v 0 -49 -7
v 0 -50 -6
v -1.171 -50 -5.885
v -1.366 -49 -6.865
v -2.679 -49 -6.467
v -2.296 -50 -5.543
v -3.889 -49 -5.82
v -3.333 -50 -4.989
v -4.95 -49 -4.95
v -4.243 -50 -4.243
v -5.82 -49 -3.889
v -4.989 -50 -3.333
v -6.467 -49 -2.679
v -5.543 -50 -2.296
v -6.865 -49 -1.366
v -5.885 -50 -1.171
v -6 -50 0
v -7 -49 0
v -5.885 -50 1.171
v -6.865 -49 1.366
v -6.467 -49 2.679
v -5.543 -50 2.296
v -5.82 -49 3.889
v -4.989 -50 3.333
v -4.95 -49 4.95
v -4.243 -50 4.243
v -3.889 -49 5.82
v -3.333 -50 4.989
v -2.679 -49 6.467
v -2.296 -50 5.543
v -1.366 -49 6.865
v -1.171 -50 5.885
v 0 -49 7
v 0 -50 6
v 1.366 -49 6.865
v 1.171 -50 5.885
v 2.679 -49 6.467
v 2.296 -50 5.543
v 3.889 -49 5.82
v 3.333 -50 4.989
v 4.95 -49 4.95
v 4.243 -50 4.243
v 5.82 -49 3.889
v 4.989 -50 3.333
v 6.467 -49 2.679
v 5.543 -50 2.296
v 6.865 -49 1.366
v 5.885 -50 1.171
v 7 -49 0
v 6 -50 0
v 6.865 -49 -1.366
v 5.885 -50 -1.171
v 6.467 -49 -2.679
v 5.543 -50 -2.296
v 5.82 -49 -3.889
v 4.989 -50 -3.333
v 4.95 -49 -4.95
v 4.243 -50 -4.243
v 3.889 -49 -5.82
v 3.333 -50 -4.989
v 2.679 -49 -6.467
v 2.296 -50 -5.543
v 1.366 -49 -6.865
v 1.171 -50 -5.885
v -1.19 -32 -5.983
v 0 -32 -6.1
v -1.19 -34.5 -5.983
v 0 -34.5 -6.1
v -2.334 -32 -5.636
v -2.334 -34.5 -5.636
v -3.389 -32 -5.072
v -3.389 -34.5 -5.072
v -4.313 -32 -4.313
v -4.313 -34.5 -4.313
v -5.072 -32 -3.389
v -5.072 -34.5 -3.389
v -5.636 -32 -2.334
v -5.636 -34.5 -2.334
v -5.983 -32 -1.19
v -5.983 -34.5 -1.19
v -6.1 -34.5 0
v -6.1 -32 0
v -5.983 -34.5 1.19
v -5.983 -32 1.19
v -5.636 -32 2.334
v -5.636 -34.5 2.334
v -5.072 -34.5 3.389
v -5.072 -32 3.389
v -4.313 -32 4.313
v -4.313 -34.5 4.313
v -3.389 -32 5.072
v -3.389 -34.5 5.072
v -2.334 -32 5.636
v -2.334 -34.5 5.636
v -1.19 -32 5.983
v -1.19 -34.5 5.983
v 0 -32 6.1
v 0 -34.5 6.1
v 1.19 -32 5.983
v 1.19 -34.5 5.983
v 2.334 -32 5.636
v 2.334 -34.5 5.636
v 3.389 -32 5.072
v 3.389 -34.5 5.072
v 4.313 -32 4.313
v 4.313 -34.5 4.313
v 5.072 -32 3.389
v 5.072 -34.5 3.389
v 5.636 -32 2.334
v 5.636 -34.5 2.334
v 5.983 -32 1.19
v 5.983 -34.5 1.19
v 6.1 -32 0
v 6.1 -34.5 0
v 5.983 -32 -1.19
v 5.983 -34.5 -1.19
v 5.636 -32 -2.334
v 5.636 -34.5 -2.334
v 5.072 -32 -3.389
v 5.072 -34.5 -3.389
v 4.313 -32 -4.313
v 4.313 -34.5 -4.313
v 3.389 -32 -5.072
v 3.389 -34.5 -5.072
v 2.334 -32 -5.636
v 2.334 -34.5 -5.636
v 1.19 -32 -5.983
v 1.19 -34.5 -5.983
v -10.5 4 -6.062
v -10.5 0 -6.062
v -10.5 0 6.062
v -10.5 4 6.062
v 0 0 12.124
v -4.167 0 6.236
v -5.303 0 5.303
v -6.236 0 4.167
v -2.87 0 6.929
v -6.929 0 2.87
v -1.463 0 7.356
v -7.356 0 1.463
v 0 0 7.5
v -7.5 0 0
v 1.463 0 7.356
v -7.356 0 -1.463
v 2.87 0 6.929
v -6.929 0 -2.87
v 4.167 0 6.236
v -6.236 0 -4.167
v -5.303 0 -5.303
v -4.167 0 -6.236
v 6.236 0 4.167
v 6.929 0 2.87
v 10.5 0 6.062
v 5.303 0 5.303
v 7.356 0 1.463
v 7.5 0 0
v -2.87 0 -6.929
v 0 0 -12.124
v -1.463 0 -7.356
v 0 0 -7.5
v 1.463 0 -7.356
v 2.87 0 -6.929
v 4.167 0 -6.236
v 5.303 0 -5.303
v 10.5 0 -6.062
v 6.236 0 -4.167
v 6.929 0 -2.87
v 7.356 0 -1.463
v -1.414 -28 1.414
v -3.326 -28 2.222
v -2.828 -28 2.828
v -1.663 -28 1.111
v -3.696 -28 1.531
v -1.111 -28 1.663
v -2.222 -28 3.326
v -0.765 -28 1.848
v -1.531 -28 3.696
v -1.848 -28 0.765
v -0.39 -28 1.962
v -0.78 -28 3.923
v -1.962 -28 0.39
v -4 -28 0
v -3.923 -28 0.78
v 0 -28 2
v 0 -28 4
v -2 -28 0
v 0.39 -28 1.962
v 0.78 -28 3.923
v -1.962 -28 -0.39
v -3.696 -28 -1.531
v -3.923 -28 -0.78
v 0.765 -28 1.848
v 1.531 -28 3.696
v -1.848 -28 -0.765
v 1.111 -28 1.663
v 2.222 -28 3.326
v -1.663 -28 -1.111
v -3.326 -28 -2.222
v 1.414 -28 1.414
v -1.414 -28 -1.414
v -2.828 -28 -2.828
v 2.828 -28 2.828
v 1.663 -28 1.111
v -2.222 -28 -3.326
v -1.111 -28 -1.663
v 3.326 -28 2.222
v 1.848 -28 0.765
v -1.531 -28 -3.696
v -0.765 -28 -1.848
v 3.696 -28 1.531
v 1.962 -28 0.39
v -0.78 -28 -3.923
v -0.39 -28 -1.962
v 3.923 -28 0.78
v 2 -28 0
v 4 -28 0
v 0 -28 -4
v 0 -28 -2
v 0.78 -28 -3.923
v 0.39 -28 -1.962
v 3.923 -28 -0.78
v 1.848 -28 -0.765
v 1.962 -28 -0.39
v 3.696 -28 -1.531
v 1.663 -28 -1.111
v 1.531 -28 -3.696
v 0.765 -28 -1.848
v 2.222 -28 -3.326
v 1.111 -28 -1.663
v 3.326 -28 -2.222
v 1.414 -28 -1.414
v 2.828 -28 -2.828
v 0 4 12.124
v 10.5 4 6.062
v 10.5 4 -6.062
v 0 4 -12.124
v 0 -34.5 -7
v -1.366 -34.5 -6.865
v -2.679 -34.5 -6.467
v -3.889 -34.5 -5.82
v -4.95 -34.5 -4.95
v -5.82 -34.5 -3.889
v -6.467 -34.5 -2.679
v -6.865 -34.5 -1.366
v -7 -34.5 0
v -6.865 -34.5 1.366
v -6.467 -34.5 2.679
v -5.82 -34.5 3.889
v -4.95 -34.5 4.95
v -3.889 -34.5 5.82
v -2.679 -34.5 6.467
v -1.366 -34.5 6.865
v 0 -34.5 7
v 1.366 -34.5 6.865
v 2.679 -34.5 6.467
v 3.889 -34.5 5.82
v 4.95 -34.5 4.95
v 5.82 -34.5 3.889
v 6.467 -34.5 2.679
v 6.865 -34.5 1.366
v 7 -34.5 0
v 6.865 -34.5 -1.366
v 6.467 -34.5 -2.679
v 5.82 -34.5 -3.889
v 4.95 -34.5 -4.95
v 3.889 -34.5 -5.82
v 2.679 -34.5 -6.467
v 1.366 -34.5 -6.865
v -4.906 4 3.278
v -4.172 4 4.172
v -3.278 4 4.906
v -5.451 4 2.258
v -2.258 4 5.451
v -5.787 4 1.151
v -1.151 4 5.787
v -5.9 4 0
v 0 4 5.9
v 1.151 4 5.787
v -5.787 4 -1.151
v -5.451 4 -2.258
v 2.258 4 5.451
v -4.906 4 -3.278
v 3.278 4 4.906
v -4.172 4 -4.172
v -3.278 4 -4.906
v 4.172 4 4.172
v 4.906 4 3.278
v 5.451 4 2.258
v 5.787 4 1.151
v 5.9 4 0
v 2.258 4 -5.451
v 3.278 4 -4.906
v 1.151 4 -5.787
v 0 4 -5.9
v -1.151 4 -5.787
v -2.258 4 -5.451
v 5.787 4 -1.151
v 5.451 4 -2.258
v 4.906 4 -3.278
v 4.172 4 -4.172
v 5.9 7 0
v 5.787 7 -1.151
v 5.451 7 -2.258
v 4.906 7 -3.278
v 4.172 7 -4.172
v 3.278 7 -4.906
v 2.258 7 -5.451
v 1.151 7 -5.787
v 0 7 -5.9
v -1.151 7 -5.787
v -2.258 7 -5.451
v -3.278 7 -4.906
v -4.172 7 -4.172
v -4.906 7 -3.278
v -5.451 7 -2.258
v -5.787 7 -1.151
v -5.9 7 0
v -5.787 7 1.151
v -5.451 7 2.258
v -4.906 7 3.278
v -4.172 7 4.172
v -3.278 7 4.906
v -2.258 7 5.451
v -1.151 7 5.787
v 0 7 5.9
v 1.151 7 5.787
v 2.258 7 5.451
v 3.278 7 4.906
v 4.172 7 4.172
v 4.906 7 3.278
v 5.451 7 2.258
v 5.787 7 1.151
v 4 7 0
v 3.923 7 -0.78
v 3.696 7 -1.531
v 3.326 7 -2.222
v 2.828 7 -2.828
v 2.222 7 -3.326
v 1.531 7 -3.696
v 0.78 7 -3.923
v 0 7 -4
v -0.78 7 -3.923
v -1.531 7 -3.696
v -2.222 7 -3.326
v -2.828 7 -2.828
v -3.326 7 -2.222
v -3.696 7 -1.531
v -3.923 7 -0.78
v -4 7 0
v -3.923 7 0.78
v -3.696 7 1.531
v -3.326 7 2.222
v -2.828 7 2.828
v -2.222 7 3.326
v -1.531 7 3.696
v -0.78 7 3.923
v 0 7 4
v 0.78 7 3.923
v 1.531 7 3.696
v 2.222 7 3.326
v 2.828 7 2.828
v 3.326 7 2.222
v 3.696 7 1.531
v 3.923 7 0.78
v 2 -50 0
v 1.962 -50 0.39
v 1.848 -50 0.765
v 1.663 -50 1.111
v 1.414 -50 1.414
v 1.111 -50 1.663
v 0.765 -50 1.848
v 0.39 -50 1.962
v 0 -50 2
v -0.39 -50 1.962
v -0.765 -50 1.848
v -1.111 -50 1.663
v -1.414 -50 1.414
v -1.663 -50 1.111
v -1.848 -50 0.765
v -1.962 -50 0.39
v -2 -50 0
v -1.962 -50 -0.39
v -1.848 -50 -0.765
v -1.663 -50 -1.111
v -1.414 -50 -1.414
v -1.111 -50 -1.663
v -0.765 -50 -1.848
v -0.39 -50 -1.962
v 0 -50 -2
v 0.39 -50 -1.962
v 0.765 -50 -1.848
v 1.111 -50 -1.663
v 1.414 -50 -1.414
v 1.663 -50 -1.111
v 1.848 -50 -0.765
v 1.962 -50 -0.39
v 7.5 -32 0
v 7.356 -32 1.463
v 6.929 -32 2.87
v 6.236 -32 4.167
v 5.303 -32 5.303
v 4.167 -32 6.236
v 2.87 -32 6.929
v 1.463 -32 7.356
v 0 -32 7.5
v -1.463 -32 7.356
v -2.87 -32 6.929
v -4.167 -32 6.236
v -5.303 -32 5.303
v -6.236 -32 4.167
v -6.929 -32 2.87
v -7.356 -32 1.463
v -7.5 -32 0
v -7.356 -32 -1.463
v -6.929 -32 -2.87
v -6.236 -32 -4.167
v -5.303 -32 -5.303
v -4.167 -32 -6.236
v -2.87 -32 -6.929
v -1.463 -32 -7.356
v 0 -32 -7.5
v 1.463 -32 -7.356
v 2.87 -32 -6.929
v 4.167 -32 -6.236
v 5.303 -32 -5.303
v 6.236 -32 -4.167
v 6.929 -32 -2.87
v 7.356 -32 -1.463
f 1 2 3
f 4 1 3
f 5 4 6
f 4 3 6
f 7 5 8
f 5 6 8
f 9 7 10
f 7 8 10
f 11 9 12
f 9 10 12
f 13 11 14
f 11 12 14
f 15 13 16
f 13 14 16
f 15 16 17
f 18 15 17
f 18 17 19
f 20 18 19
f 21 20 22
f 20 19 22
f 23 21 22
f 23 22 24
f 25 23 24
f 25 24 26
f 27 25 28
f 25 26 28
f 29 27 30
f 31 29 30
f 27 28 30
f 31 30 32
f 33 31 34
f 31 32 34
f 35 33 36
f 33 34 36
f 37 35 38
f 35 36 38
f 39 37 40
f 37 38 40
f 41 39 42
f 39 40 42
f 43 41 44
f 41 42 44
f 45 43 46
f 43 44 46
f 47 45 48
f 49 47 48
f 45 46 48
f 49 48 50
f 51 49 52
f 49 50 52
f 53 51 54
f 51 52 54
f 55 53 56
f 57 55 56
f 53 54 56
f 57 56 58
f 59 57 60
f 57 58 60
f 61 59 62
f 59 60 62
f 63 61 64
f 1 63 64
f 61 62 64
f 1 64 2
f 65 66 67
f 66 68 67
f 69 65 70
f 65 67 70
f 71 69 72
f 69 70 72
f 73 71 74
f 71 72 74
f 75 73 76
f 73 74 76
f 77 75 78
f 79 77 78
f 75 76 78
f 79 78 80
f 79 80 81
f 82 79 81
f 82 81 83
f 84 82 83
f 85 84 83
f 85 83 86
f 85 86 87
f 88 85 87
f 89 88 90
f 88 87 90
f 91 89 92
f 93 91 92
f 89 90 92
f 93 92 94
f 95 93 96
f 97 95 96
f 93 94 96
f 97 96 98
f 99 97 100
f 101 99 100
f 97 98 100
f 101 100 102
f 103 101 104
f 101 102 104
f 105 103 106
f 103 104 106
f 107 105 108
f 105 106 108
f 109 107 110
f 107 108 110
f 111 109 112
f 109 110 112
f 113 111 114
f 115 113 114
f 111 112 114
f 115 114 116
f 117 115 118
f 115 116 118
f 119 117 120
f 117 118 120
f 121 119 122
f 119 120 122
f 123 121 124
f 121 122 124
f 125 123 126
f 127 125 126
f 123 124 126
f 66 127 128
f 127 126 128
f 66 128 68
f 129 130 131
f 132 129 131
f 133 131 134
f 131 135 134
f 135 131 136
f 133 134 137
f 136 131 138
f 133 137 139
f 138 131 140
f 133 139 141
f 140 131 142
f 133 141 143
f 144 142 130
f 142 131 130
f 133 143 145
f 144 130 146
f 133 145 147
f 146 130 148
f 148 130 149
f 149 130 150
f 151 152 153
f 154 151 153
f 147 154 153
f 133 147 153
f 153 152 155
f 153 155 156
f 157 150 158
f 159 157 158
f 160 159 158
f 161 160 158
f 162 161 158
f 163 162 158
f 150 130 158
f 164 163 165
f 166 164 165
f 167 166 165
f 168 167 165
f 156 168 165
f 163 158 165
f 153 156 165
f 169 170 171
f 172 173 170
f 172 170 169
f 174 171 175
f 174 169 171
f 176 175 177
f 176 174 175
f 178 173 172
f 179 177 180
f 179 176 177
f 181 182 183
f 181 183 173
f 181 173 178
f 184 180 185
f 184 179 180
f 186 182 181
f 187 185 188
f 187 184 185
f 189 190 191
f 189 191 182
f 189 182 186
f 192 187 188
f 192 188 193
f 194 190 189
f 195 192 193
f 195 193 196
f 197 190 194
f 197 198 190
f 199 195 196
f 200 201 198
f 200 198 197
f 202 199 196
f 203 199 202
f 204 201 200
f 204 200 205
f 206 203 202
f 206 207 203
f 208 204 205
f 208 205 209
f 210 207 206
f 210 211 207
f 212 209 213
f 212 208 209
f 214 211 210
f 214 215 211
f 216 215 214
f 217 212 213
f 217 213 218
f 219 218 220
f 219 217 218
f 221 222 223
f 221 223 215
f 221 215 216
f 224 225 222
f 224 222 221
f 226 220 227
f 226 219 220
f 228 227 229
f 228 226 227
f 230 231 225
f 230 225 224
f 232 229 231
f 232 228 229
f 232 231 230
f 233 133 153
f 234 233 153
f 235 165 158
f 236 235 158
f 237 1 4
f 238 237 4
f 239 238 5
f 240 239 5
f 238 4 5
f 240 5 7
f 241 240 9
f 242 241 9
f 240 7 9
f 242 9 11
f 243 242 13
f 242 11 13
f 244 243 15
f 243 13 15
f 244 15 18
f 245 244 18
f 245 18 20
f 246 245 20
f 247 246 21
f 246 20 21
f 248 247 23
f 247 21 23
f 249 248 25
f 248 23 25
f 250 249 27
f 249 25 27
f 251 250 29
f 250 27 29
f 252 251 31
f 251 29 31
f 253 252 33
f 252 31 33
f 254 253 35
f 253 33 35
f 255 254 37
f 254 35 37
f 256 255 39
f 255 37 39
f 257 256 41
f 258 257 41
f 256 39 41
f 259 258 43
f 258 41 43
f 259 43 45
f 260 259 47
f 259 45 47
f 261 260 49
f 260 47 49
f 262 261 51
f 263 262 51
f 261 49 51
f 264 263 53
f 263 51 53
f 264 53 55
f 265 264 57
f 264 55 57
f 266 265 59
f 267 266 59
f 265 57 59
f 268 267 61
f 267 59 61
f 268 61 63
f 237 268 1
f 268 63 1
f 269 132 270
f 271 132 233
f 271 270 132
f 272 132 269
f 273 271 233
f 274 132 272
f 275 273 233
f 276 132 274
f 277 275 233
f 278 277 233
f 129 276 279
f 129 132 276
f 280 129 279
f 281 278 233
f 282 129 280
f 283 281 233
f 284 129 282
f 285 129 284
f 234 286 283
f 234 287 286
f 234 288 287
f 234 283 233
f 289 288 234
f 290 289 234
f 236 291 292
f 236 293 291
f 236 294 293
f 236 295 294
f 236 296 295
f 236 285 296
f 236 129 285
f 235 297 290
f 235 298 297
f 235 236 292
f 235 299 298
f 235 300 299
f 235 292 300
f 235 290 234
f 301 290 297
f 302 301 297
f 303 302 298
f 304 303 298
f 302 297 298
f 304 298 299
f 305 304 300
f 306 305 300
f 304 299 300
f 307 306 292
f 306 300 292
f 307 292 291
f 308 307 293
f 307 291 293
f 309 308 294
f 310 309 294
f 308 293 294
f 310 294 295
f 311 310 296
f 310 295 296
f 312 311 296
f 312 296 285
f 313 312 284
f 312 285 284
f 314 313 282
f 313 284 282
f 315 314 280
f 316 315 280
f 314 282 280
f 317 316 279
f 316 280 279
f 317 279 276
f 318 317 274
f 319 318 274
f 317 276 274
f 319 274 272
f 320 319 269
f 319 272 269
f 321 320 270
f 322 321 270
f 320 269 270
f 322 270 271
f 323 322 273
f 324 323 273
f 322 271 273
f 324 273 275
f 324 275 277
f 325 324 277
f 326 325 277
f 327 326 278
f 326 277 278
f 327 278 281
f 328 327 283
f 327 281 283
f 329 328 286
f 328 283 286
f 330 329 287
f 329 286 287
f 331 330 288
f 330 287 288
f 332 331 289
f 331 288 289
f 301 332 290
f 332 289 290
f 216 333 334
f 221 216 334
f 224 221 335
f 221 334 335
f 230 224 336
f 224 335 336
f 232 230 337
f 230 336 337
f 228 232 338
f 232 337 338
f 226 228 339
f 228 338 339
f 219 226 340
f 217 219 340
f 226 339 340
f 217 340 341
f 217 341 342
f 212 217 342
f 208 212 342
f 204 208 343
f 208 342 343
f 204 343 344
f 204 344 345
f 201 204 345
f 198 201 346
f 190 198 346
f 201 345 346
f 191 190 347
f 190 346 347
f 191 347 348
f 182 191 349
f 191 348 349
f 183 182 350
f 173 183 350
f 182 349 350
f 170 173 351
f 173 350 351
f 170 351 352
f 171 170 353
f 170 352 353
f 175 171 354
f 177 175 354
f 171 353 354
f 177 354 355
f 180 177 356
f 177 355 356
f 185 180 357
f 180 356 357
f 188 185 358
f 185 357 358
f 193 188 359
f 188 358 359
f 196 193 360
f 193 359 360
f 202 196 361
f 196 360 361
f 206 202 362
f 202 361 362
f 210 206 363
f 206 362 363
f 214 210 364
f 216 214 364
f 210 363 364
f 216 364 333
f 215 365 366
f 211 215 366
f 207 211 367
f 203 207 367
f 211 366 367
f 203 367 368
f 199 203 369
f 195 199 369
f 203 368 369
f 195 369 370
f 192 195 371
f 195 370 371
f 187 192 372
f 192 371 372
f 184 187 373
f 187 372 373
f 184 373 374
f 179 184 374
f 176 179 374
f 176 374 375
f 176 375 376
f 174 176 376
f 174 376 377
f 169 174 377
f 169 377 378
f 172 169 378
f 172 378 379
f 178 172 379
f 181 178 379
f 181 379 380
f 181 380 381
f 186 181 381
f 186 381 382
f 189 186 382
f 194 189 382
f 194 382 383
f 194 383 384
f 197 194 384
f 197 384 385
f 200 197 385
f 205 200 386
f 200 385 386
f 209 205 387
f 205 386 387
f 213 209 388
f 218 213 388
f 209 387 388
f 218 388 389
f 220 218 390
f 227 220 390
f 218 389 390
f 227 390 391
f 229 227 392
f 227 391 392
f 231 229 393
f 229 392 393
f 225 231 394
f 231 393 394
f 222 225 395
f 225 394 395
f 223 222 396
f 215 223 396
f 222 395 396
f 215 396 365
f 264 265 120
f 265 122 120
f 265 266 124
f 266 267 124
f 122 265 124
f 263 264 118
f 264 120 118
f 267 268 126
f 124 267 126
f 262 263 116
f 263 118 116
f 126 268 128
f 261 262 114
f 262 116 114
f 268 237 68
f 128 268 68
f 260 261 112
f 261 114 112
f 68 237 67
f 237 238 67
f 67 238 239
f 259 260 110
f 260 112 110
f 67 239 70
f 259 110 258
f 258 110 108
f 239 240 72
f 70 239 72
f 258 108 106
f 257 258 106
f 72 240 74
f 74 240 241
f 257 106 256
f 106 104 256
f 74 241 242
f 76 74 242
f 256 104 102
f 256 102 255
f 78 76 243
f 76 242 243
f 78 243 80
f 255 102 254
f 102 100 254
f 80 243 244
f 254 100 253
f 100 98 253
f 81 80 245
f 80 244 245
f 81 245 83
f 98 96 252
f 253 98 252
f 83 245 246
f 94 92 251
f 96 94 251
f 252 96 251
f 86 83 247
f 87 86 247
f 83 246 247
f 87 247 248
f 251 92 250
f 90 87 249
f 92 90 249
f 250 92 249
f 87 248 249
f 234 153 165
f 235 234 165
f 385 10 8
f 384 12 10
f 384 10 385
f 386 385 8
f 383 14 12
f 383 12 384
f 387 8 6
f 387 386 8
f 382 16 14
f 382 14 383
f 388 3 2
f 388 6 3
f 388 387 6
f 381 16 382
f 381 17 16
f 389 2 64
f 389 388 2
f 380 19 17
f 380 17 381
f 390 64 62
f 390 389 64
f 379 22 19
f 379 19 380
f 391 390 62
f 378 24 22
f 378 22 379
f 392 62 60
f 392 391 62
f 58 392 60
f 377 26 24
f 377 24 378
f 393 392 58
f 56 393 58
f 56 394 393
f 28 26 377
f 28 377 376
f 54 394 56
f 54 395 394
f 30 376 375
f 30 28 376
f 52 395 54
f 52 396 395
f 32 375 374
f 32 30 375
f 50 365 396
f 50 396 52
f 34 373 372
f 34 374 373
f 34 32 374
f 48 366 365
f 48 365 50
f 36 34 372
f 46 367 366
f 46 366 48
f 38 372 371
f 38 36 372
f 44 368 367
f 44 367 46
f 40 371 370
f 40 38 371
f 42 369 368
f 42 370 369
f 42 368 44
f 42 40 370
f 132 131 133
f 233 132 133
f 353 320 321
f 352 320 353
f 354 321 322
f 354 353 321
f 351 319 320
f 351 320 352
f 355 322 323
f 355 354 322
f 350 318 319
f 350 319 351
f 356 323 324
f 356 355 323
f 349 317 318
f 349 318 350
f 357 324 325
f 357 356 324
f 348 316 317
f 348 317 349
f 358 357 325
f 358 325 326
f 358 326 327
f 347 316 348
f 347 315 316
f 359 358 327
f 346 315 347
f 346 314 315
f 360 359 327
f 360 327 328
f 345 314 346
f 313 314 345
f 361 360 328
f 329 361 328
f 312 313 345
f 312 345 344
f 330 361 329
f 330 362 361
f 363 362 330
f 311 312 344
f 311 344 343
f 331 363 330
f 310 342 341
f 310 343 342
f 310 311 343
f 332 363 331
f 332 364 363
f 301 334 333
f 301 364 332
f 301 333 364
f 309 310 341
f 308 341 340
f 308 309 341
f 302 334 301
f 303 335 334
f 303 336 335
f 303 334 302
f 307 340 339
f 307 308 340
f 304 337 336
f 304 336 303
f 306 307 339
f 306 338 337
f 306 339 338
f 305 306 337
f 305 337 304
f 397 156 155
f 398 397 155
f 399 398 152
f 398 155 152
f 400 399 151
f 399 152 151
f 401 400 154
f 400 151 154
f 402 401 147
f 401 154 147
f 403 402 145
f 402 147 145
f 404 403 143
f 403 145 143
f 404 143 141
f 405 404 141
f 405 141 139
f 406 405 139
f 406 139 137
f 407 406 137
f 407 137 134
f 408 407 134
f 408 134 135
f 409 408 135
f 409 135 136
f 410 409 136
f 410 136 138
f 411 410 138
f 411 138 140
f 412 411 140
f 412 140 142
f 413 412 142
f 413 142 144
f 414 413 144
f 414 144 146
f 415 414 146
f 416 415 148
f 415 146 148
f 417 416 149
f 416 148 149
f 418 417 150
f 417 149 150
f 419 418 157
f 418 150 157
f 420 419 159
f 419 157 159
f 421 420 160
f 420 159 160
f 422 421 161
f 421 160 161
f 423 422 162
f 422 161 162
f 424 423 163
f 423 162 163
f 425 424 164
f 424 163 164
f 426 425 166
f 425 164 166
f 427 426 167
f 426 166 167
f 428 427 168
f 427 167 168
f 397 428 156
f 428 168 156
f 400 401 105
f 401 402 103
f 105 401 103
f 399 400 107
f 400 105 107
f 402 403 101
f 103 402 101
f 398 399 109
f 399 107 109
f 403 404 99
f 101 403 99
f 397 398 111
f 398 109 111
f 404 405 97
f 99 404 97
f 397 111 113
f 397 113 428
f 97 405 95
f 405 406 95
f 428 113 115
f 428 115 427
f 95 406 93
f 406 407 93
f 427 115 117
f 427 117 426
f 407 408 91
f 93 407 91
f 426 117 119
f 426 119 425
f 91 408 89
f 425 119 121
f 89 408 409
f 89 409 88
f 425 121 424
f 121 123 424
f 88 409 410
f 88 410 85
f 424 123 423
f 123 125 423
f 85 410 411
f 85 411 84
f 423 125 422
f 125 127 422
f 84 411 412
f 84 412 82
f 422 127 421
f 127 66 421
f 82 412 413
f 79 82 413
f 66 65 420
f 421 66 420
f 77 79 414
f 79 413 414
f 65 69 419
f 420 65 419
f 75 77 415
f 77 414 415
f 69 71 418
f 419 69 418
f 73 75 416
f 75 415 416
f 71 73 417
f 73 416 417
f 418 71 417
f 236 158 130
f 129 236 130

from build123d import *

# Parameters (mm, degrees)
EXTRUDE_1_DEPTH     = 4
SKETCH_2_R          = 5.9
EXTRUDE_2_DEPTH     = 3
SKETCH_3_R          = 7.5
EXTRUDE_3_DEPTH     = 50
SKETCH_4_R          = 4
CUT_EXTRUDE_1_DEPTH = 35
SKETCH_7_R          = 2
CUT_EXTRUDE_2_DEPTH = 58
CHAMFER_1_SIZE      = 1


with BuildPart() as part:
    # Эскиз1 → Бобышка-Вытянуть1 (new body)
    with BuildSketch(Plane(origin=(0, 0, 0), x_dir=(1, 0, 0), z_dir=(0, 1, 0))):
        Polygon((10.5, -6.062177826), (10.5, 6.062177826), (0, 12.124355653), (-10.5, 6.062177826), (-10.5, -6.062177826), (0, -12.124355653), align=None)
    extrude(amount=EXTRUDE_1_DEPTH)

    # Эскиз2 → Бобышка-Вытянуть2 (add)
    with BuildSketch(Plane(origin=(0, 4, 0), x_dir=(1, 0, 0), z_dir=(0, 1, 0))):
        Circle(SKETCH_2_R)
    extrude(amount=EXTRUDE_2_DEPTH)

    # Эскиз3 → Бобышка-Вытянуть3 (add)
    with BuildSketch(Plane.XZ):
        Circle(SKETCH_3_R)
    extrude(amount=EXTRUDE_3_DEPTH)

    # Эскиз4 → Вырез-Вытянуть1 (cut)
    with BuildSketch(Plane(origin=(0, 7, 0), x_dir=(1, 0, 0), z_dir=(0, 1, 0))):
        Circle(SKETCH_4_R)
    extrude(amount=-CUT_EXTRUDE_1_DEPTH, mode=Mode.SUBTRACT)

    # Эскиз6 → Вырез-Повернуть1 (revolve, cut)
    with BuildSketch(Plane(origin=(0, 0, 0), x_dir=(0, 0, -1), z_dir=(1, 0, 0))):
        Polygon((7.5, -50), (7.5, -32), (6.1, -32), (6.1, -34.5), (7, -34.5), (7, -50), align=None)
    revolve(axis=Axis((0, -50.526489701, 0), (0, 1, 0)), mode=Mode.SUBTRACT)

    # Эскиз7 → Вырез-Вытянуть2 (cut, through all)
    with BuildSketch(Plane.XZ.offset(50)):
        Circle(SKETCH_7_R)
    extrude(amount=-CUT_EXTRUDE_2_DEPTH, mode=Mode.SUBTRACT)

    # Фаска1
    chamfer_1_edges = [part.edges().sort_by_distance(p)[0] for p in [
        (0, -50, 7),
    ]]
    chamfer(chamfer_1_edges, length=CHAMFER_1_SIZE)


solid = part.part
